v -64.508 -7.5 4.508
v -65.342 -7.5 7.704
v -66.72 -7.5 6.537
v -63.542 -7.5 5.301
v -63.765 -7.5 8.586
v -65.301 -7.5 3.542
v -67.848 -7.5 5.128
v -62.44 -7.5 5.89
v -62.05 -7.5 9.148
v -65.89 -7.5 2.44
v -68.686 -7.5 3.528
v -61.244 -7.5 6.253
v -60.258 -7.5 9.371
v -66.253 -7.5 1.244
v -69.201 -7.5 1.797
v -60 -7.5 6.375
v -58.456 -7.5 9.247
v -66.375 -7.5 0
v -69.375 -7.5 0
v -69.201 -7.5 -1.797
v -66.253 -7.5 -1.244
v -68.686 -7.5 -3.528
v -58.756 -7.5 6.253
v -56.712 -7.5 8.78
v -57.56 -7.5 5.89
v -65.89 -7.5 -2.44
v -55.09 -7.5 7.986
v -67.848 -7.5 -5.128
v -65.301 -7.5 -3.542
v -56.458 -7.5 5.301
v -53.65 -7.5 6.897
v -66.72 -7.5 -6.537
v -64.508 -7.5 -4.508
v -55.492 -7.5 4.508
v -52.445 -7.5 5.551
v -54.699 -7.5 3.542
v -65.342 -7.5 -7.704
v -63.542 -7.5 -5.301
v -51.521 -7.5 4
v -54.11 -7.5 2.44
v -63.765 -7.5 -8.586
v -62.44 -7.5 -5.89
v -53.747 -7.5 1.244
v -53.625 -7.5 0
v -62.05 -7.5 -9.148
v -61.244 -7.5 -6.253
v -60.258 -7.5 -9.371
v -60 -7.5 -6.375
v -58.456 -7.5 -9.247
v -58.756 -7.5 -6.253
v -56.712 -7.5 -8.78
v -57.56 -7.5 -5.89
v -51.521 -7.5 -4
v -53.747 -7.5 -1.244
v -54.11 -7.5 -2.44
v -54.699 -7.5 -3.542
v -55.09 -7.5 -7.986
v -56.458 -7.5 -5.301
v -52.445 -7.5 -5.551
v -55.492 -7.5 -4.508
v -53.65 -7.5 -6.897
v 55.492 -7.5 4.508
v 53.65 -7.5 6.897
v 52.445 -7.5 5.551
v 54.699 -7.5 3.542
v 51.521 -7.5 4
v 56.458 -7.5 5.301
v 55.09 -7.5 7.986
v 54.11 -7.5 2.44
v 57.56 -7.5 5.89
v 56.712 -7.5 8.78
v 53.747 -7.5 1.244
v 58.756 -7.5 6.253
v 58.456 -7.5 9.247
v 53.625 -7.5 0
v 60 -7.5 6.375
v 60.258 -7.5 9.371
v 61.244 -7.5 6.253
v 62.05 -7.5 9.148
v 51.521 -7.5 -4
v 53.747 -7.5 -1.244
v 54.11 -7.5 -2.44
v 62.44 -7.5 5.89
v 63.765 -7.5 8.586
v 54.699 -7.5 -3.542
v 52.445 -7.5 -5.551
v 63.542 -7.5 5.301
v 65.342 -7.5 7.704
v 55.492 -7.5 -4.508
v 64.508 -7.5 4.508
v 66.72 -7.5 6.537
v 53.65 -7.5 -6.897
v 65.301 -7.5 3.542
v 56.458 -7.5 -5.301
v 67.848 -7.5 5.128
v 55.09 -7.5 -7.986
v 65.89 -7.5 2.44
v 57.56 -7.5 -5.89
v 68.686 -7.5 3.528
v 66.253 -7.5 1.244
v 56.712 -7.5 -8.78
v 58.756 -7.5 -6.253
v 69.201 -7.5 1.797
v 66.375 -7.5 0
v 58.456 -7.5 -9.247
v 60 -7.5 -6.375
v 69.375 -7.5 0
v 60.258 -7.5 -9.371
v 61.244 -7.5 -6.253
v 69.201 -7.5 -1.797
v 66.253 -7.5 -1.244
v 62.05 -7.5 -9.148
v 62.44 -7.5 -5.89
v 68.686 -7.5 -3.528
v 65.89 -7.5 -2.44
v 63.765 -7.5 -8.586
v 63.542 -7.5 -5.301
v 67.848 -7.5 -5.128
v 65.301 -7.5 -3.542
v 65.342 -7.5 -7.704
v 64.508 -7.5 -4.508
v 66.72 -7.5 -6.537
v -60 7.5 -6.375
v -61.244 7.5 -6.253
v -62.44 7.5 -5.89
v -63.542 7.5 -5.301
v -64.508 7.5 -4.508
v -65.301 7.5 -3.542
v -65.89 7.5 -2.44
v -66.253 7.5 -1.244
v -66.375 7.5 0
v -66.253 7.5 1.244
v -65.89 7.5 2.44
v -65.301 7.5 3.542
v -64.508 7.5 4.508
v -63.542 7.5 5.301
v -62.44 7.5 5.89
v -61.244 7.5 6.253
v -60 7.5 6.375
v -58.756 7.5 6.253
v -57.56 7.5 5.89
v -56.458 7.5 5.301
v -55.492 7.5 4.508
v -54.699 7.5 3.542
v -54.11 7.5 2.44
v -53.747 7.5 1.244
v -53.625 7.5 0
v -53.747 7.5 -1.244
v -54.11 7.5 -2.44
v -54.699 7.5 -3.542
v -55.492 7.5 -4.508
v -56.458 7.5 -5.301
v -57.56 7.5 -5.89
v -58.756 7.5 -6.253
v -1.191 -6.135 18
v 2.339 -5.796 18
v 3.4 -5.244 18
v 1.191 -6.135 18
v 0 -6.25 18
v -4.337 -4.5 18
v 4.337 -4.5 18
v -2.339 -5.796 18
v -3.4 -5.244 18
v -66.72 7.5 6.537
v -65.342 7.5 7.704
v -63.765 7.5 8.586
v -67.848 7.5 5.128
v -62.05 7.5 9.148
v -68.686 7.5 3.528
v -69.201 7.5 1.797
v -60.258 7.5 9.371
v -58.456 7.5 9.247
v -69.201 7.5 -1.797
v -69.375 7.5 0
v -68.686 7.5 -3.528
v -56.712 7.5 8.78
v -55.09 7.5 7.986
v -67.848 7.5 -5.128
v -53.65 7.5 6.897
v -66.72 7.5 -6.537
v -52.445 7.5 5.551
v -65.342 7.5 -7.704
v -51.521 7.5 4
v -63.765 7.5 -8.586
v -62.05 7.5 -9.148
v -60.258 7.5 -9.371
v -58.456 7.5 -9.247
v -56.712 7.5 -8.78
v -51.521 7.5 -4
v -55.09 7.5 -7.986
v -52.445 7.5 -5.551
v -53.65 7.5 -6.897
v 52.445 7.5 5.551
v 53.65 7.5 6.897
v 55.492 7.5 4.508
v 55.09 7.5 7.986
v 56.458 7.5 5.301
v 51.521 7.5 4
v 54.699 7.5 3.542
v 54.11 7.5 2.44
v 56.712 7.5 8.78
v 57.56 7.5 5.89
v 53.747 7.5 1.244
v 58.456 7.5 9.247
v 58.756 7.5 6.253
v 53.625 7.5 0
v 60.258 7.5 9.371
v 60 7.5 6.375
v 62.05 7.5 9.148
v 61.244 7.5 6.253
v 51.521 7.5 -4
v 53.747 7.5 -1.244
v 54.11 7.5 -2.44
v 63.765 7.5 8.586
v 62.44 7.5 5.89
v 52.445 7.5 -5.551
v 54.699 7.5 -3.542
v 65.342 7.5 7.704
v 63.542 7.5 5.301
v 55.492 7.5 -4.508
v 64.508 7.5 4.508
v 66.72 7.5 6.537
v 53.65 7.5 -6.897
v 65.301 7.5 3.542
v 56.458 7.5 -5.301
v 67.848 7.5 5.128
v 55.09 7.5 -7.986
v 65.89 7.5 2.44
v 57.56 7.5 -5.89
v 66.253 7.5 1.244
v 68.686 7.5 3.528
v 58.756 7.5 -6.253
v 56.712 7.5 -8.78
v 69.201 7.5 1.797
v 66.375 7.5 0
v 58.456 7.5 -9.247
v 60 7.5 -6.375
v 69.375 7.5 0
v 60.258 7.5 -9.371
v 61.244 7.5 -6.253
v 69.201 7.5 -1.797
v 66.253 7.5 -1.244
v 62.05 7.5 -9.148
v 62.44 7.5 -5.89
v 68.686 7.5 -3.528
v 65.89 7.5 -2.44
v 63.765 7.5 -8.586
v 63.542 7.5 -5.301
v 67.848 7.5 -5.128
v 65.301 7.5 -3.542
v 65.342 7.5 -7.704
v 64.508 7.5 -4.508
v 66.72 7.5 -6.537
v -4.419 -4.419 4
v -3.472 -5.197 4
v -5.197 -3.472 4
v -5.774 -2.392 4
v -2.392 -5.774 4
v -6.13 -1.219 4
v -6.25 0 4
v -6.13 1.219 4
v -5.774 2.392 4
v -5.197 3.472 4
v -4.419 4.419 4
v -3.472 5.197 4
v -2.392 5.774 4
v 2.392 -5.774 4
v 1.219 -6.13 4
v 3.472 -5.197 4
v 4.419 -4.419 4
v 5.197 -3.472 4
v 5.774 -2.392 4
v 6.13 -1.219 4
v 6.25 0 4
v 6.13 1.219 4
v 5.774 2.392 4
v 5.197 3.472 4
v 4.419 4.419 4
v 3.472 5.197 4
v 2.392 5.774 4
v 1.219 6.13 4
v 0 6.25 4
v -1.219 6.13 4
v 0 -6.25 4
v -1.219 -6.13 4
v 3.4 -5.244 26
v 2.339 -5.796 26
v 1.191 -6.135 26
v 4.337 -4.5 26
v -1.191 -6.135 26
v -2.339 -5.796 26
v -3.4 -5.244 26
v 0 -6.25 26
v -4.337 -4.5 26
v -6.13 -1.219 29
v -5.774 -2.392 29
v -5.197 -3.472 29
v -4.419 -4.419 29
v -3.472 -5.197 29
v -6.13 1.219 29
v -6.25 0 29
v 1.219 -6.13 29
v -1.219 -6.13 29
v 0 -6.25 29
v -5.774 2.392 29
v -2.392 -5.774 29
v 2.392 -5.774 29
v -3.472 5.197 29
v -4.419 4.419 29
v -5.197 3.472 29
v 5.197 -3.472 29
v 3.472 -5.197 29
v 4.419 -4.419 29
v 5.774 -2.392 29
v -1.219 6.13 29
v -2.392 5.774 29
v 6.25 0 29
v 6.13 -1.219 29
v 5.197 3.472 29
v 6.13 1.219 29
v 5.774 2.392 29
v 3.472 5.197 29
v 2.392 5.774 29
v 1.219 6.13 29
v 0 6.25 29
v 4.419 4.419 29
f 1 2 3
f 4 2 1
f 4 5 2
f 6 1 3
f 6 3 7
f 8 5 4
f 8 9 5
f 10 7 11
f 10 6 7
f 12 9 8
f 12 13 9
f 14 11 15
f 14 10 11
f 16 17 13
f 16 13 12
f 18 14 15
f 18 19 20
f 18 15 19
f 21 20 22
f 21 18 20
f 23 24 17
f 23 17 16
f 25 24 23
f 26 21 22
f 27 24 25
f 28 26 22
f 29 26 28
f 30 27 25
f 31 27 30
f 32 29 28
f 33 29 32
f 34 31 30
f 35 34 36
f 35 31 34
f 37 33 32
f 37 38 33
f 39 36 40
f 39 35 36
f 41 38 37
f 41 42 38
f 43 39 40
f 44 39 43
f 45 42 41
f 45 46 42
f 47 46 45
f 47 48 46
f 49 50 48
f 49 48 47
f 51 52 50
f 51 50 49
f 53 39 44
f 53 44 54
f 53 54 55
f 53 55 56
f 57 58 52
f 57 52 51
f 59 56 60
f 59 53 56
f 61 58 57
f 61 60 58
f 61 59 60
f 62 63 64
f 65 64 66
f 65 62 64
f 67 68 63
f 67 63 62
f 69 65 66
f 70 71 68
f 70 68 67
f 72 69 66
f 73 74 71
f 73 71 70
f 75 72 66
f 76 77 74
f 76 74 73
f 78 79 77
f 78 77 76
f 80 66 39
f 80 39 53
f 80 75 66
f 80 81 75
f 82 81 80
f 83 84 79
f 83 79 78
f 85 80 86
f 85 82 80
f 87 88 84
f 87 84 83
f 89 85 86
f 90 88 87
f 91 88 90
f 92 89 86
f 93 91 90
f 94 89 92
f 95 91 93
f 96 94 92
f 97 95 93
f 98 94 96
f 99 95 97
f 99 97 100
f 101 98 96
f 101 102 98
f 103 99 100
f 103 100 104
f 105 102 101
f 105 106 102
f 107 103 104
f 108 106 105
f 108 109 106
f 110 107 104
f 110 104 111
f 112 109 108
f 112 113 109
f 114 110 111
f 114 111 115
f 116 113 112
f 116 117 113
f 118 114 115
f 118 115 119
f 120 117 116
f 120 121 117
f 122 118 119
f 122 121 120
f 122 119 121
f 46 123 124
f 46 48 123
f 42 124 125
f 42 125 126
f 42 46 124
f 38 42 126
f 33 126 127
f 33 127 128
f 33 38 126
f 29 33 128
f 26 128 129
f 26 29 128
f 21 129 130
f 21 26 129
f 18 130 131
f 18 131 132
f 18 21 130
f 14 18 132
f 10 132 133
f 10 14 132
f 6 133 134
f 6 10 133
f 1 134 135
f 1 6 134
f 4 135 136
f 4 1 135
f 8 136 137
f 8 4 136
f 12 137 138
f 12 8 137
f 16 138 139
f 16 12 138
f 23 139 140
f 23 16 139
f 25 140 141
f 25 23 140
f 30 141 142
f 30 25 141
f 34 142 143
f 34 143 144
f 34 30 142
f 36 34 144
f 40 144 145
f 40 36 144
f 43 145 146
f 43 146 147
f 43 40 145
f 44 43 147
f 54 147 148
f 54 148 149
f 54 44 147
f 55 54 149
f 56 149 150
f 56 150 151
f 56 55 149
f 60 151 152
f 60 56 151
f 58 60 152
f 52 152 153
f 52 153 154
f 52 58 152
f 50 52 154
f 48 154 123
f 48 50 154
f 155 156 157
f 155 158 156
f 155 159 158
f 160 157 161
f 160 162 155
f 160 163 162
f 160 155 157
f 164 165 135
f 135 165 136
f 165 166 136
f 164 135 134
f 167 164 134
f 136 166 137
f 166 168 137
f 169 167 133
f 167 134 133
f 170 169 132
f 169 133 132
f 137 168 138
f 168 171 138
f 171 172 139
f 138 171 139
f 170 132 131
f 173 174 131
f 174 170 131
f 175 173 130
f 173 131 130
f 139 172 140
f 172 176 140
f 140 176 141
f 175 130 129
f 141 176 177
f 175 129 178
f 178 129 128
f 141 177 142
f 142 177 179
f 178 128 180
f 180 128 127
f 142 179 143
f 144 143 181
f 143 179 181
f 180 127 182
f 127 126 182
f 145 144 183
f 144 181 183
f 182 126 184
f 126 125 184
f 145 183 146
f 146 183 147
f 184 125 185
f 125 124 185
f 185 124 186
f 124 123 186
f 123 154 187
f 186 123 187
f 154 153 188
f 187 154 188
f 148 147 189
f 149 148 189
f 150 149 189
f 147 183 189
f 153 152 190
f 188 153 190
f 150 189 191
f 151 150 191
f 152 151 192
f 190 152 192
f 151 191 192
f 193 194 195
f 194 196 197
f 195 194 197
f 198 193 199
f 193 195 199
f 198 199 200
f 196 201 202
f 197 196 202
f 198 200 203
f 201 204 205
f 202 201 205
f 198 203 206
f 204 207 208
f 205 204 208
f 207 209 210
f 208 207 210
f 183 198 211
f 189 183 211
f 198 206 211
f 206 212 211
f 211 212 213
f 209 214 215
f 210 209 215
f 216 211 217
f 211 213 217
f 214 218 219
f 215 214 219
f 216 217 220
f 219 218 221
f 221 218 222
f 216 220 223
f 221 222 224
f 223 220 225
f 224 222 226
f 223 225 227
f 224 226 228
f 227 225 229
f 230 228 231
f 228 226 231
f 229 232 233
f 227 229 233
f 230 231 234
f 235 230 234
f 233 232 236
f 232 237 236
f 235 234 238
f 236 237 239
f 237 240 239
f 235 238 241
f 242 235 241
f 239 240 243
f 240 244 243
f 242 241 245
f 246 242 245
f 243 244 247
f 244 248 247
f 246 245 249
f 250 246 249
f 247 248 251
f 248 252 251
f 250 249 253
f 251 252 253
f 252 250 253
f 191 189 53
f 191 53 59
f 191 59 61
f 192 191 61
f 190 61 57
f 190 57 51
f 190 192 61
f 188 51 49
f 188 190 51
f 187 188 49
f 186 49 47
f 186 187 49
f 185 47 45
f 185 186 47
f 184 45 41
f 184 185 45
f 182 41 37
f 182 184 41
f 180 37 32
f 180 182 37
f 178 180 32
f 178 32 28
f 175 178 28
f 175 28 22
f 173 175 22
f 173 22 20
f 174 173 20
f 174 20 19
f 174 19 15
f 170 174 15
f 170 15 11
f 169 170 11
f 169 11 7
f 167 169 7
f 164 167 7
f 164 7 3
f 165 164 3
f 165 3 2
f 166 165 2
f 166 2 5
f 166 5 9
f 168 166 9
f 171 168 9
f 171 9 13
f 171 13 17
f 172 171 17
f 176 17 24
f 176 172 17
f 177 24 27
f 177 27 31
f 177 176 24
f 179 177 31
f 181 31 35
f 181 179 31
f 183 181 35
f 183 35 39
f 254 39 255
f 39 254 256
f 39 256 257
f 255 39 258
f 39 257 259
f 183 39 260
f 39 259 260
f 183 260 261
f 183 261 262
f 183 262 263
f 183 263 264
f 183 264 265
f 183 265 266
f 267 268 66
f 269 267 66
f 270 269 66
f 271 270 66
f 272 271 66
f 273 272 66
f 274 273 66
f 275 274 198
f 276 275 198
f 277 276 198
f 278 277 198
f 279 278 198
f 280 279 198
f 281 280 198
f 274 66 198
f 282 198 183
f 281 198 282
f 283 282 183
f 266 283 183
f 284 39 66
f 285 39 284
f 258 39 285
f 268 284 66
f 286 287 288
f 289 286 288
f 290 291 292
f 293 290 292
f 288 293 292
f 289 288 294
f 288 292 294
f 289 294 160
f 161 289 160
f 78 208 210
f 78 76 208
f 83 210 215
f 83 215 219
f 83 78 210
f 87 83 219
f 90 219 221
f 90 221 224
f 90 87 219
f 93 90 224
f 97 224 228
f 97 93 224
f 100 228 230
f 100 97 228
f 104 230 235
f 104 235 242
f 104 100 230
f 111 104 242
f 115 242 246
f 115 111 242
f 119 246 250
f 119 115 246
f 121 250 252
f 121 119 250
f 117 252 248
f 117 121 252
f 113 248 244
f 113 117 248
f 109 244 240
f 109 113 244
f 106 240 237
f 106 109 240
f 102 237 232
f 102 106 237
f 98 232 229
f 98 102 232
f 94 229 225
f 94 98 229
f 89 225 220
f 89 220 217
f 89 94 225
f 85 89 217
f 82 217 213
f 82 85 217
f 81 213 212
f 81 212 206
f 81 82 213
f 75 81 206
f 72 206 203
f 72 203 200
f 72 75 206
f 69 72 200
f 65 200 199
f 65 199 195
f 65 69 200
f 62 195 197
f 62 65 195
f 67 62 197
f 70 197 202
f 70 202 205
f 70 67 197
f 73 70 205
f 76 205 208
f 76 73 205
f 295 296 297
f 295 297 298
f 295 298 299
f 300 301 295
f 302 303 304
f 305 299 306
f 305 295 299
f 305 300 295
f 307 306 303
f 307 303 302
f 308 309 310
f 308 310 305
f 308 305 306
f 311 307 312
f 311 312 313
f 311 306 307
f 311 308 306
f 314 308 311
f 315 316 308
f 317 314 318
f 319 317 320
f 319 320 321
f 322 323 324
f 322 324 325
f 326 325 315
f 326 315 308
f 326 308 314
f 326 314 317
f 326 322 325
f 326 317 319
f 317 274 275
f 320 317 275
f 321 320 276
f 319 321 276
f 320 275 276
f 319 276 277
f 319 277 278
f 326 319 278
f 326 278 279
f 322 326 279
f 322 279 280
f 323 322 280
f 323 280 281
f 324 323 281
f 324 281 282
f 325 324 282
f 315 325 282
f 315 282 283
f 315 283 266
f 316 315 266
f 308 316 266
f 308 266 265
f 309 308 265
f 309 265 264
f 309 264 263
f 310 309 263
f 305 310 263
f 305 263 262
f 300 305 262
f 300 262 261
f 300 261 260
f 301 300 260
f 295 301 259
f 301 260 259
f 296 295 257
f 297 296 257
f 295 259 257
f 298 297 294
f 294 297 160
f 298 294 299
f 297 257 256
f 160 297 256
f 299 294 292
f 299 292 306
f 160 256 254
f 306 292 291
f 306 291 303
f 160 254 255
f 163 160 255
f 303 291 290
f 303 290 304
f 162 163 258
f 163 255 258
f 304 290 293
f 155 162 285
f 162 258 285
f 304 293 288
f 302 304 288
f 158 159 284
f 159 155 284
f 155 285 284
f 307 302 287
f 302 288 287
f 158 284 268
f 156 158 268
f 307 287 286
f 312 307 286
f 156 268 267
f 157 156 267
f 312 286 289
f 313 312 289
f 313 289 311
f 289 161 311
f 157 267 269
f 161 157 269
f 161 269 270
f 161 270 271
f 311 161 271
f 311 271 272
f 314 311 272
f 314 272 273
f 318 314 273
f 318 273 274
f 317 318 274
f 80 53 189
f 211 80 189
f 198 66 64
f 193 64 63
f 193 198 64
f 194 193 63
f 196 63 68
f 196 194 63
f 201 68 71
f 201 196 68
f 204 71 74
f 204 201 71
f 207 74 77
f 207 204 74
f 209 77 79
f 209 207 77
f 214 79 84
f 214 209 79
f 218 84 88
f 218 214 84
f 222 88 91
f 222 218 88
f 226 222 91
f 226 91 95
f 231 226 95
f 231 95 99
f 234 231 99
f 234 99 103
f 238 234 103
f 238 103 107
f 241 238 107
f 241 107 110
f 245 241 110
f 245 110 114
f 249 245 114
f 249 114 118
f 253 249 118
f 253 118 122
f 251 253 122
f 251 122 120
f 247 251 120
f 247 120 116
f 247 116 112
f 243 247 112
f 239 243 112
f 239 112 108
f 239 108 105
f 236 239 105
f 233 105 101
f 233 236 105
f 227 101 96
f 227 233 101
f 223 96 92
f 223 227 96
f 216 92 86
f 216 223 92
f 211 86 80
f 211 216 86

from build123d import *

# Parameters (mm, degrees)
SKETCH1_R                            = 9.375
SKETCH1_R_2                          = 6.375
BOSS_EXTRUDE1_DEPTH                  = 7.5
BOSS_EXTRUDE1_2_DEPTH                = 7.5
BOSS_EXTRUDE2_REACH                  = 72.406
BOSS_EXTRUDE2_END_RADIUS             = 9.375
SKETCH2_W                            = 8
SKETCH2_H                            = 15
BOSS_EXTRUDE2_DIRECTION_2_REACH      = 72.406
BOSS_EXTRUDE2_DIRECTION_2_END_RADIUS = 9.375
SKETCH4_R                            = 6.25
BOSS_EXTRUDE3_DEPTH                  = 25
CUT_EXTRUDE1_REACH                   = 77.565
CUT_EXTRUDE1_END_RADIUS              = 6.25
SKETCH5_W                            = 8
SKETCH5_H                            = 3
CUT_EXTRUDE1_DIRECTION_2_REACH       = 77.565
CUT_EXTRUDE1_DIRECTION_2_END_RADIUS  = 6.25


with BuildPart() as part:
    # Sketch1 → Boss-Extrude1 (new, symmetric)
    with BuildSketch(Plane(origin=(0, 0, 0), x_dir=(1, 0, 0), z_dir=(0, 1, 0))):
        with Locations(Location((-60, 0, 0), (0, 0, 90))):
            Circle(SKETCH1_R)
        with Locations(Location((-60, 0, 0), (0, 0, 90))):
            Circle(SKETCH1_R_2, mode=Mode.SUBTRACT)
    extrude(amount=BOSS_EXTRUDE1_DEPTH, both=True)



with BuildPart() as body_2:
    # Sketch1 → Boss-Extrude1 2 (new, symmetric)
    with BuildSketch(Plane(origin=(0, 0, 0), x_dir=(1, 0, 0), z_dir=(0, 1, 0))):
        with Locations(Location((60, 0, 0), (0, 0, 270))):
            Circle(SKETCH1_R)
        with Locations(Location((60, 0, 0), (0, 0, 270))):
            Circle(SKETCH1_R_2, mode=Mode.SUBTRACT)
    extrude(amount=BOSS_EXTRUDE1_2_DEPTH, both=True)


with BuildPart() as part_1:
    add(part.part)

    add(body_2.part)  # Boss-Extrude2 merges body 2
    # Boss-Extrude2: up to this cylinder (the profile starts outside it)
    boss_extrude2_end = Plane(origin=(60, 0, 0), z_dir=(0, -1, 0)) * Cylinder(BOSS_EXTRUDE2_END_RADIUS, 164.562, mode=Mode.PRIVATE)
    # Sketch2 → Boss-Extrude2 (add, up to the surface)
    with BuildSketch(Plane(origin=(0, 0, 0), x_dir=(0, 0, -1), z_dir=(1, 0, 0)), mode=Mode.PRIVATE) as boss_extrude2_sk1:
        Rectangle(SKETCH2_W, SKETCH2_H)
    boss_extrude2_tool1 = extrude(boss_extrude2_sk1.sketch, amount=BOSS_EXTRUDE2_REACH, mode=Mode.PRIVATE) - boss_extrude2_end
    add(boss_extrude2_tool1.solids().sort_by_distance((0, 0, 0))[0])

    # Boss-Extrude2 direction 2: up to this cylinder (the profile starts outside it)
    boss_extrude2_direction_2_end = Plane(origin=(-60, 0, 0), z_dir=(0, -1, 0)) * Cylinder(BOSS_EXTRUDE2_DIRECTION_2_END_RADIUS, 164.562, mode=Mode.PRIVATE)
    # Sketch2 → Boss-Extrude2 direction 2 (add, up to the surface)
    with BuildSketch(Plane(origin=(0, 0, 0), x_dir=(0, 0, -1), z_dir=(1, 0, 0)), mode=Mode.PRIVATE) as boss_extrude2_direction_2_sk1:
        Rectangle(SKETCH2_W, SKETCH2_H)
    boss_extrude2_direction_2_tool1 = extrude(boss_extrude2_direction_2_sk1.sketch, amount=-BOSS_EXTRUDE2_DIRECTION_2_REACH, mode=Mode.PRIVATE) - boss_extrude2_direction_2_end
    add(boss_extrude2_direction_2_tool1.solids().sort_by_distance((0, 0, 0))[0])

    # Sketch4 → Boss-Extrude3 (add)
    with BuildSketch(Plane.XY.offset(4)):
        Circle(SKETCH4_R)
    extrude(amount=BOSS_EXTRUDE3_DEPTH)

    # Cut-Extrude1: up to this cylinder (the profile starts inside it)
    cut_extrude1_end = Plane(origin=(0, 0, 22), z_dir=(0, 0, -1)) * Cylinder(CUT_EXTRUDE1_END_RADIUS, 168.63, mode=Mode.PRIVATE)
    # Sketch5 → Cut-Extrude1 (cut, up to the surface)
    with BuildSketch(Plane(origin=(0, 0, 0), x_dir=(0, 0, -1), z_dir=(1, 0, 0)), mode=Mode.PRIVATE) as cut_extrude1_sk1:
        with Locations((-22, -6)):
            Rectangle(SKETCH5_W, SKETCH5_H)
    cut_extrude1_tool1 = extrude(cut_extrude1_sk1.sketch, amount=-CUT_EXTRUDE1_REACH, mode=Mode.PRIVATE) & cut_extrude1_end
    add(cut_extrude1_tool1.solids().sort_by_distance((0, -6, 22))[0], mode=Mode.SUBTRACT)

    # Cut-Extrude1 direction 2: up to this cylinder (the profile starts inside it)
    cut_extrude1_direction_2_end = Plane(origin=(0, 0, 22), z_dir=(0, 0, -1)) * Cylinder(CUT_EXTRUDE1_DIRECTION_2_END_RADIUS, 168.63, mode=Mode.PRIVATE)
    # Sketch5 → Cut-Extrude1 direction 2 (cut, up to the surface)
    with BuildSketch(Plane(origin=(0, 0, 0), x_dir=(0, 0, -1), z_dir=(1, 0, 0)), mode=Mode.PRIVATE) as cut_extrude1_direction_2_sk1:
        with Locations((-22, -6)):
            Rectangle(SKETCH5_W, SKETCH5_H)
    cut_extrude1_direction_2_tool1 = extrude(cut_extrude1_direction_2_sk1.sketch, amount=CUT_EXTRUDE1_DIRECTION_2_REACH, mode=Mode.PRIVATE) & cut_extrude1_direction_2_end
    add(cut_extrude1_direction_2_tool1.solids().sort_by_distance((0, -6, 22))[0], mode=Mode.SUBTRACT)


solid = part_1.part
